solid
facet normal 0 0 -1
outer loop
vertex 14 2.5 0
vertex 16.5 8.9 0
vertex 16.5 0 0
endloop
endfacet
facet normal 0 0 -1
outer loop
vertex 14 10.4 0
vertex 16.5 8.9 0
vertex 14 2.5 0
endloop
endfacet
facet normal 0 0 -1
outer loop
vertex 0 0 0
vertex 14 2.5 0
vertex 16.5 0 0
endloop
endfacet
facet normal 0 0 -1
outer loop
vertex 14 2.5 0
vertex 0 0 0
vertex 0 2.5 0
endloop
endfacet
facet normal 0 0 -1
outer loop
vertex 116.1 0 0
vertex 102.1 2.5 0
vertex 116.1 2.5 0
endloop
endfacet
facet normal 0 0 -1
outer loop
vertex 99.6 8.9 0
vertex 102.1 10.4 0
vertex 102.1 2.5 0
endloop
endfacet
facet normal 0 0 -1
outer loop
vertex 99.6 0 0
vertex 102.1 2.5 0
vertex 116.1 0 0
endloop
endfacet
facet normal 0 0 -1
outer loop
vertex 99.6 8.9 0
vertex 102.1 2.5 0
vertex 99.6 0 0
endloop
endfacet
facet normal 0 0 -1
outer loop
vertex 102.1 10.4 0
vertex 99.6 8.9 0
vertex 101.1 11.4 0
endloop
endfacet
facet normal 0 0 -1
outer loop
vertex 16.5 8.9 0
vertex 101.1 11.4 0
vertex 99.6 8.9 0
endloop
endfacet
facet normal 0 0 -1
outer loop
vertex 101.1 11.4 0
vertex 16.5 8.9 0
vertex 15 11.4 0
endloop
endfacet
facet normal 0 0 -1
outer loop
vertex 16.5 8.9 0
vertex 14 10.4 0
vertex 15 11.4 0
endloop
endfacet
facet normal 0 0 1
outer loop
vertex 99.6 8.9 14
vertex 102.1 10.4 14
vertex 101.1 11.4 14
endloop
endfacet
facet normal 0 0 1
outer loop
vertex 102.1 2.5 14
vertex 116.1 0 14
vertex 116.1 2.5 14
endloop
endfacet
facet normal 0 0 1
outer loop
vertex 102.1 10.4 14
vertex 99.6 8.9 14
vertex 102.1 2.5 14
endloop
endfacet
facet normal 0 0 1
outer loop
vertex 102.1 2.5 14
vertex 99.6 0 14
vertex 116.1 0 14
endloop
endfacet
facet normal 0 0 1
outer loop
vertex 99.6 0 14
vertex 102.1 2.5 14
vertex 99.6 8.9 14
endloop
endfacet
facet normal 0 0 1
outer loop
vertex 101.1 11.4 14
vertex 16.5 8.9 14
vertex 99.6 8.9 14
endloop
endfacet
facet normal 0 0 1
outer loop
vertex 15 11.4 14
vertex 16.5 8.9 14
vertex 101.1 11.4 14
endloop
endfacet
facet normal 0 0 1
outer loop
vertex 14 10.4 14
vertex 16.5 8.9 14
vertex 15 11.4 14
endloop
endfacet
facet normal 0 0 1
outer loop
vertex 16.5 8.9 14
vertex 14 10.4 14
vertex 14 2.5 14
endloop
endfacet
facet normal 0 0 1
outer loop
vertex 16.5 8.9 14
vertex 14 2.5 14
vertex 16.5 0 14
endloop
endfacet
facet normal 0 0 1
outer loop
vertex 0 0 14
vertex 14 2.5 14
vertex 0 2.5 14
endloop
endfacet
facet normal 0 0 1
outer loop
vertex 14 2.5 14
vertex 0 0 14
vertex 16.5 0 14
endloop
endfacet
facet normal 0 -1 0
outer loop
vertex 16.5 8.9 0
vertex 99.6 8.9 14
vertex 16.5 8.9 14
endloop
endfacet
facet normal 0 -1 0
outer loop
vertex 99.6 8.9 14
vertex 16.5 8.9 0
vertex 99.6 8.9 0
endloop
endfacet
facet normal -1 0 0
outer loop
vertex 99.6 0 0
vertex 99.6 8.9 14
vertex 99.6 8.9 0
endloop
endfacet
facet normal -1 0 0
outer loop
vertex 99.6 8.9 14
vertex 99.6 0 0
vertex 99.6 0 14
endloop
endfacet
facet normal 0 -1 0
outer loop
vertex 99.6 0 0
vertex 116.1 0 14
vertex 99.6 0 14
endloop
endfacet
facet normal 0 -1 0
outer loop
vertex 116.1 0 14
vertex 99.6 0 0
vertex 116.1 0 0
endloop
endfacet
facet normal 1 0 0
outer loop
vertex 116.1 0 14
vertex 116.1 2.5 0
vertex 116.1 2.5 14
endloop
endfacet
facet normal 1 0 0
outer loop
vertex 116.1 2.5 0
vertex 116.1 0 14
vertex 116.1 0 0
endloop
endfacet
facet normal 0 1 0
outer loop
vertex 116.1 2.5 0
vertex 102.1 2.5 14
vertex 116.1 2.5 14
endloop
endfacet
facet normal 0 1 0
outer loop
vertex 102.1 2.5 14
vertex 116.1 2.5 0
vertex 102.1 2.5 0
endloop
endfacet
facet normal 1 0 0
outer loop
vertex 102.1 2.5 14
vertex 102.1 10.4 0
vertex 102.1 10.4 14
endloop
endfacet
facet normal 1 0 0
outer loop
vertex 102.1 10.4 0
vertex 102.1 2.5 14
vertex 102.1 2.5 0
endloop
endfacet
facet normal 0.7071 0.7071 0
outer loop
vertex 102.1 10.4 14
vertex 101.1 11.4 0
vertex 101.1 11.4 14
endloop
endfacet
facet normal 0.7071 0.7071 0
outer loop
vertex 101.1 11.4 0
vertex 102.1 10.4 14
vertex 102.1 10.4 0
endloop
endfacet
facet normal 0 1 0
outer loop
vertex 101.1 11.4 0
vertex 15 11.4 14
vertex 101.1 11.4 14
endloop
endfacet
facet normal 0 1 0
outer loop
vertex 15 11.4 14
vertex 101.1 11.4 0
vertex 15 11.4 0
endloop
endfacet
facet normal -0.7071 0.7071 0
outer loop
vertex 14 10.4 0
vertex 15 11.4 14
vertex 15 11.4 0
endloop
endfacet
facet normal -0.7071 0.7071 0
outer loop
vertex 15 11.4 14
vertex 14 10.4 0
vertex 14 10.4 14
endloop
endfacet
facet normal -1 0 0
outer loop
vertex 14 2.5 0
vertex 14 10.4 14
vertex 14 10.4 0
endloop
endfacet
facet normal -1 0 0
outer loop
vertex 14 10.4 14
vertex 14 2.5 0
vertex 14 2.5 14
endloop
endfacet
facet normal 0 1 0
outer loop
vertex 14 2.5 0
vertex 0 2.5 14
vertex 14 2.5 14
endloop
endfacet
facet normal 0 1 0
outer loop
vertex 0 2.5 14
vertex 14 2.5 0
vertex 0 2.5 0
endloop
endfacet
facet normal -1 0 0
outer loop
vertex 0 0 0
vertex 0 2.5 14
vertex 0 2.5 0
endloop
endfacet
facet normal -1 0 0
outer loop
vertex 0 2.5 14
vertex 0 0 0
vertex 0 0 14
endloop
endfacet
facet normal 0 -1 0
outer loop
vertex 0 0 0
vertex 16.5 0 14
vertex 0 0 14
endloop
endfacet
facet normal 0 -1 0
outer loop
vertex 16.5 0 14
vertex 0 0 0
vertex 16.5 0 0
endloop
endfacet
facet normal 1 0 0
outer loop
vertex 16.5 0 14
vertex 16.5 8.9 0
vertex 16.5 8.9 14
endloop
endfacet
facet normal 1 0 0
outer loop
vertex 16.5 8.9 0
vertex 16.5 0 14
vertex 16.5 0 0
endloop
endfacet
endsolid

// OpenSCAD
// file: Parts/Screw.scad
module screw(diameter, length, cutout_sample = false, fs = 0.1, fa = 1) {
    //$fs = 0.1; [size in mm] | $fa = 1; [degrees]
    //$fn = 100; [defined faces]

    module base_model(diameter, length, cone_height, cone_diameter, offset = 0, fs = 0.1, fa = 1) {
        rotate_extrude($fs = fs) {
            polygon([
                    [0, 0],
                    [(diameter + offset) / 2, 0],
                    [(diameter + offset) / 2, (length + offset) - (cone_height + offset)],
                    [(cone_diameter + offset) / 2, length + offset],
                    [0, length + offset],
                ]);
        }
    }

    if (length < diameter) {
        echo("Screw is too short");
        length = diameter + 1;
        echo("New length is: ", length);
    }

    cone_height = diameter * 0.85;
    cone_diameter = diameter * 2;

    if (!cutout_sample) {
        translate([0, 0, - length])
            difference() {
                base_model(diameter, length, cone_height, cone_diameter);

                // top cross part
                translate([0, 0, length + 0.1 - (cone_height - diameter / 2)])
                    difference() {
                        rotate([0, 0, 45])
                            rotate_extrude($fn = 4) {
                                polygon([
                                        [0, 0],
                                        [diameter * 1.4 / 2, 0],
                                        [cone_diameter / 2, cone_height - diameter / 2],
                                        [0, cone_height - diameter / 2],
                                    ]);
                            }
                        for (i = [0 : 1 : 3]) {
                            rotate([0, 0, 90 * i])
                                translate([diameter / 3.18 / 2, diameter / 3.18 / 2, - 0.1])
                                    cube(cone_height + 0.2);
                        }
                    }
            }
    } else {
        offset = 0.2;
        translate([0, 0, - length - offset / 2])
            base_model(diameter, length, cone_height, cone_diameter, offset);
    }
}

function screw_cone_diameter(screw_diameter) = screw_diameter * 2;

screw(3.5, 12);
// main file
use <Parts/Screw.scad>

thickness = 2.5;
screwSocketWidth = 14;
splitterWidth = 83.1;
chamfer = 1;

module Bracket() {
    linear_extrude(height = screwSocketWidth) {
        endWidth = (screwSocketWidth + thickness) * 2;
        polygon(points = [
                [0, 0],
                [screwSocketWidth + thickness, 0],
                [screwSocketWidth + thickness, 8.9],
                [screwSocketWidth + thickness + splitterWidth, 8.9],
                [screwSocketWidth + thickness + splitterWidth, 0],
                [endWidth + splitterWidth, 0],
                [endWidth + splitterWidth, thickness],
                [screwSocketWidth + thickness + splitterWidth + thickness, thickness],
                [screwSocketWidth + thickness + splitterWidth + thickness, 8.9 + thickness - chamfer],
                [screwSocketWidth + thickness + splitterWidth + thickness - chamfer, 8.9 + thickness],
                [screwSocketWidth + chamfer, 8.9 + thickness],
                [screwSocketWidth, 8.9 + thickness - chamfer],
                [screwSocketWidth, thickness],
                [0, thickness]
            ]);
    }
}
difference() {
    Bracket();
    translate([screwSocketWidth / 2, - 2.5, screwSocketWidth / 2])
        rotate([- 90, 0, 0]) screw(3, 5, false);
    translate([screwSocketWidth + splitterWidth + thickness * 2, 0, 0])
        translate([screwSocketWidth / 2, - 2.5, screwSocketWidth / 2])
            rotate([- 90, 0, 0]) screw(3, 5, false);
}
